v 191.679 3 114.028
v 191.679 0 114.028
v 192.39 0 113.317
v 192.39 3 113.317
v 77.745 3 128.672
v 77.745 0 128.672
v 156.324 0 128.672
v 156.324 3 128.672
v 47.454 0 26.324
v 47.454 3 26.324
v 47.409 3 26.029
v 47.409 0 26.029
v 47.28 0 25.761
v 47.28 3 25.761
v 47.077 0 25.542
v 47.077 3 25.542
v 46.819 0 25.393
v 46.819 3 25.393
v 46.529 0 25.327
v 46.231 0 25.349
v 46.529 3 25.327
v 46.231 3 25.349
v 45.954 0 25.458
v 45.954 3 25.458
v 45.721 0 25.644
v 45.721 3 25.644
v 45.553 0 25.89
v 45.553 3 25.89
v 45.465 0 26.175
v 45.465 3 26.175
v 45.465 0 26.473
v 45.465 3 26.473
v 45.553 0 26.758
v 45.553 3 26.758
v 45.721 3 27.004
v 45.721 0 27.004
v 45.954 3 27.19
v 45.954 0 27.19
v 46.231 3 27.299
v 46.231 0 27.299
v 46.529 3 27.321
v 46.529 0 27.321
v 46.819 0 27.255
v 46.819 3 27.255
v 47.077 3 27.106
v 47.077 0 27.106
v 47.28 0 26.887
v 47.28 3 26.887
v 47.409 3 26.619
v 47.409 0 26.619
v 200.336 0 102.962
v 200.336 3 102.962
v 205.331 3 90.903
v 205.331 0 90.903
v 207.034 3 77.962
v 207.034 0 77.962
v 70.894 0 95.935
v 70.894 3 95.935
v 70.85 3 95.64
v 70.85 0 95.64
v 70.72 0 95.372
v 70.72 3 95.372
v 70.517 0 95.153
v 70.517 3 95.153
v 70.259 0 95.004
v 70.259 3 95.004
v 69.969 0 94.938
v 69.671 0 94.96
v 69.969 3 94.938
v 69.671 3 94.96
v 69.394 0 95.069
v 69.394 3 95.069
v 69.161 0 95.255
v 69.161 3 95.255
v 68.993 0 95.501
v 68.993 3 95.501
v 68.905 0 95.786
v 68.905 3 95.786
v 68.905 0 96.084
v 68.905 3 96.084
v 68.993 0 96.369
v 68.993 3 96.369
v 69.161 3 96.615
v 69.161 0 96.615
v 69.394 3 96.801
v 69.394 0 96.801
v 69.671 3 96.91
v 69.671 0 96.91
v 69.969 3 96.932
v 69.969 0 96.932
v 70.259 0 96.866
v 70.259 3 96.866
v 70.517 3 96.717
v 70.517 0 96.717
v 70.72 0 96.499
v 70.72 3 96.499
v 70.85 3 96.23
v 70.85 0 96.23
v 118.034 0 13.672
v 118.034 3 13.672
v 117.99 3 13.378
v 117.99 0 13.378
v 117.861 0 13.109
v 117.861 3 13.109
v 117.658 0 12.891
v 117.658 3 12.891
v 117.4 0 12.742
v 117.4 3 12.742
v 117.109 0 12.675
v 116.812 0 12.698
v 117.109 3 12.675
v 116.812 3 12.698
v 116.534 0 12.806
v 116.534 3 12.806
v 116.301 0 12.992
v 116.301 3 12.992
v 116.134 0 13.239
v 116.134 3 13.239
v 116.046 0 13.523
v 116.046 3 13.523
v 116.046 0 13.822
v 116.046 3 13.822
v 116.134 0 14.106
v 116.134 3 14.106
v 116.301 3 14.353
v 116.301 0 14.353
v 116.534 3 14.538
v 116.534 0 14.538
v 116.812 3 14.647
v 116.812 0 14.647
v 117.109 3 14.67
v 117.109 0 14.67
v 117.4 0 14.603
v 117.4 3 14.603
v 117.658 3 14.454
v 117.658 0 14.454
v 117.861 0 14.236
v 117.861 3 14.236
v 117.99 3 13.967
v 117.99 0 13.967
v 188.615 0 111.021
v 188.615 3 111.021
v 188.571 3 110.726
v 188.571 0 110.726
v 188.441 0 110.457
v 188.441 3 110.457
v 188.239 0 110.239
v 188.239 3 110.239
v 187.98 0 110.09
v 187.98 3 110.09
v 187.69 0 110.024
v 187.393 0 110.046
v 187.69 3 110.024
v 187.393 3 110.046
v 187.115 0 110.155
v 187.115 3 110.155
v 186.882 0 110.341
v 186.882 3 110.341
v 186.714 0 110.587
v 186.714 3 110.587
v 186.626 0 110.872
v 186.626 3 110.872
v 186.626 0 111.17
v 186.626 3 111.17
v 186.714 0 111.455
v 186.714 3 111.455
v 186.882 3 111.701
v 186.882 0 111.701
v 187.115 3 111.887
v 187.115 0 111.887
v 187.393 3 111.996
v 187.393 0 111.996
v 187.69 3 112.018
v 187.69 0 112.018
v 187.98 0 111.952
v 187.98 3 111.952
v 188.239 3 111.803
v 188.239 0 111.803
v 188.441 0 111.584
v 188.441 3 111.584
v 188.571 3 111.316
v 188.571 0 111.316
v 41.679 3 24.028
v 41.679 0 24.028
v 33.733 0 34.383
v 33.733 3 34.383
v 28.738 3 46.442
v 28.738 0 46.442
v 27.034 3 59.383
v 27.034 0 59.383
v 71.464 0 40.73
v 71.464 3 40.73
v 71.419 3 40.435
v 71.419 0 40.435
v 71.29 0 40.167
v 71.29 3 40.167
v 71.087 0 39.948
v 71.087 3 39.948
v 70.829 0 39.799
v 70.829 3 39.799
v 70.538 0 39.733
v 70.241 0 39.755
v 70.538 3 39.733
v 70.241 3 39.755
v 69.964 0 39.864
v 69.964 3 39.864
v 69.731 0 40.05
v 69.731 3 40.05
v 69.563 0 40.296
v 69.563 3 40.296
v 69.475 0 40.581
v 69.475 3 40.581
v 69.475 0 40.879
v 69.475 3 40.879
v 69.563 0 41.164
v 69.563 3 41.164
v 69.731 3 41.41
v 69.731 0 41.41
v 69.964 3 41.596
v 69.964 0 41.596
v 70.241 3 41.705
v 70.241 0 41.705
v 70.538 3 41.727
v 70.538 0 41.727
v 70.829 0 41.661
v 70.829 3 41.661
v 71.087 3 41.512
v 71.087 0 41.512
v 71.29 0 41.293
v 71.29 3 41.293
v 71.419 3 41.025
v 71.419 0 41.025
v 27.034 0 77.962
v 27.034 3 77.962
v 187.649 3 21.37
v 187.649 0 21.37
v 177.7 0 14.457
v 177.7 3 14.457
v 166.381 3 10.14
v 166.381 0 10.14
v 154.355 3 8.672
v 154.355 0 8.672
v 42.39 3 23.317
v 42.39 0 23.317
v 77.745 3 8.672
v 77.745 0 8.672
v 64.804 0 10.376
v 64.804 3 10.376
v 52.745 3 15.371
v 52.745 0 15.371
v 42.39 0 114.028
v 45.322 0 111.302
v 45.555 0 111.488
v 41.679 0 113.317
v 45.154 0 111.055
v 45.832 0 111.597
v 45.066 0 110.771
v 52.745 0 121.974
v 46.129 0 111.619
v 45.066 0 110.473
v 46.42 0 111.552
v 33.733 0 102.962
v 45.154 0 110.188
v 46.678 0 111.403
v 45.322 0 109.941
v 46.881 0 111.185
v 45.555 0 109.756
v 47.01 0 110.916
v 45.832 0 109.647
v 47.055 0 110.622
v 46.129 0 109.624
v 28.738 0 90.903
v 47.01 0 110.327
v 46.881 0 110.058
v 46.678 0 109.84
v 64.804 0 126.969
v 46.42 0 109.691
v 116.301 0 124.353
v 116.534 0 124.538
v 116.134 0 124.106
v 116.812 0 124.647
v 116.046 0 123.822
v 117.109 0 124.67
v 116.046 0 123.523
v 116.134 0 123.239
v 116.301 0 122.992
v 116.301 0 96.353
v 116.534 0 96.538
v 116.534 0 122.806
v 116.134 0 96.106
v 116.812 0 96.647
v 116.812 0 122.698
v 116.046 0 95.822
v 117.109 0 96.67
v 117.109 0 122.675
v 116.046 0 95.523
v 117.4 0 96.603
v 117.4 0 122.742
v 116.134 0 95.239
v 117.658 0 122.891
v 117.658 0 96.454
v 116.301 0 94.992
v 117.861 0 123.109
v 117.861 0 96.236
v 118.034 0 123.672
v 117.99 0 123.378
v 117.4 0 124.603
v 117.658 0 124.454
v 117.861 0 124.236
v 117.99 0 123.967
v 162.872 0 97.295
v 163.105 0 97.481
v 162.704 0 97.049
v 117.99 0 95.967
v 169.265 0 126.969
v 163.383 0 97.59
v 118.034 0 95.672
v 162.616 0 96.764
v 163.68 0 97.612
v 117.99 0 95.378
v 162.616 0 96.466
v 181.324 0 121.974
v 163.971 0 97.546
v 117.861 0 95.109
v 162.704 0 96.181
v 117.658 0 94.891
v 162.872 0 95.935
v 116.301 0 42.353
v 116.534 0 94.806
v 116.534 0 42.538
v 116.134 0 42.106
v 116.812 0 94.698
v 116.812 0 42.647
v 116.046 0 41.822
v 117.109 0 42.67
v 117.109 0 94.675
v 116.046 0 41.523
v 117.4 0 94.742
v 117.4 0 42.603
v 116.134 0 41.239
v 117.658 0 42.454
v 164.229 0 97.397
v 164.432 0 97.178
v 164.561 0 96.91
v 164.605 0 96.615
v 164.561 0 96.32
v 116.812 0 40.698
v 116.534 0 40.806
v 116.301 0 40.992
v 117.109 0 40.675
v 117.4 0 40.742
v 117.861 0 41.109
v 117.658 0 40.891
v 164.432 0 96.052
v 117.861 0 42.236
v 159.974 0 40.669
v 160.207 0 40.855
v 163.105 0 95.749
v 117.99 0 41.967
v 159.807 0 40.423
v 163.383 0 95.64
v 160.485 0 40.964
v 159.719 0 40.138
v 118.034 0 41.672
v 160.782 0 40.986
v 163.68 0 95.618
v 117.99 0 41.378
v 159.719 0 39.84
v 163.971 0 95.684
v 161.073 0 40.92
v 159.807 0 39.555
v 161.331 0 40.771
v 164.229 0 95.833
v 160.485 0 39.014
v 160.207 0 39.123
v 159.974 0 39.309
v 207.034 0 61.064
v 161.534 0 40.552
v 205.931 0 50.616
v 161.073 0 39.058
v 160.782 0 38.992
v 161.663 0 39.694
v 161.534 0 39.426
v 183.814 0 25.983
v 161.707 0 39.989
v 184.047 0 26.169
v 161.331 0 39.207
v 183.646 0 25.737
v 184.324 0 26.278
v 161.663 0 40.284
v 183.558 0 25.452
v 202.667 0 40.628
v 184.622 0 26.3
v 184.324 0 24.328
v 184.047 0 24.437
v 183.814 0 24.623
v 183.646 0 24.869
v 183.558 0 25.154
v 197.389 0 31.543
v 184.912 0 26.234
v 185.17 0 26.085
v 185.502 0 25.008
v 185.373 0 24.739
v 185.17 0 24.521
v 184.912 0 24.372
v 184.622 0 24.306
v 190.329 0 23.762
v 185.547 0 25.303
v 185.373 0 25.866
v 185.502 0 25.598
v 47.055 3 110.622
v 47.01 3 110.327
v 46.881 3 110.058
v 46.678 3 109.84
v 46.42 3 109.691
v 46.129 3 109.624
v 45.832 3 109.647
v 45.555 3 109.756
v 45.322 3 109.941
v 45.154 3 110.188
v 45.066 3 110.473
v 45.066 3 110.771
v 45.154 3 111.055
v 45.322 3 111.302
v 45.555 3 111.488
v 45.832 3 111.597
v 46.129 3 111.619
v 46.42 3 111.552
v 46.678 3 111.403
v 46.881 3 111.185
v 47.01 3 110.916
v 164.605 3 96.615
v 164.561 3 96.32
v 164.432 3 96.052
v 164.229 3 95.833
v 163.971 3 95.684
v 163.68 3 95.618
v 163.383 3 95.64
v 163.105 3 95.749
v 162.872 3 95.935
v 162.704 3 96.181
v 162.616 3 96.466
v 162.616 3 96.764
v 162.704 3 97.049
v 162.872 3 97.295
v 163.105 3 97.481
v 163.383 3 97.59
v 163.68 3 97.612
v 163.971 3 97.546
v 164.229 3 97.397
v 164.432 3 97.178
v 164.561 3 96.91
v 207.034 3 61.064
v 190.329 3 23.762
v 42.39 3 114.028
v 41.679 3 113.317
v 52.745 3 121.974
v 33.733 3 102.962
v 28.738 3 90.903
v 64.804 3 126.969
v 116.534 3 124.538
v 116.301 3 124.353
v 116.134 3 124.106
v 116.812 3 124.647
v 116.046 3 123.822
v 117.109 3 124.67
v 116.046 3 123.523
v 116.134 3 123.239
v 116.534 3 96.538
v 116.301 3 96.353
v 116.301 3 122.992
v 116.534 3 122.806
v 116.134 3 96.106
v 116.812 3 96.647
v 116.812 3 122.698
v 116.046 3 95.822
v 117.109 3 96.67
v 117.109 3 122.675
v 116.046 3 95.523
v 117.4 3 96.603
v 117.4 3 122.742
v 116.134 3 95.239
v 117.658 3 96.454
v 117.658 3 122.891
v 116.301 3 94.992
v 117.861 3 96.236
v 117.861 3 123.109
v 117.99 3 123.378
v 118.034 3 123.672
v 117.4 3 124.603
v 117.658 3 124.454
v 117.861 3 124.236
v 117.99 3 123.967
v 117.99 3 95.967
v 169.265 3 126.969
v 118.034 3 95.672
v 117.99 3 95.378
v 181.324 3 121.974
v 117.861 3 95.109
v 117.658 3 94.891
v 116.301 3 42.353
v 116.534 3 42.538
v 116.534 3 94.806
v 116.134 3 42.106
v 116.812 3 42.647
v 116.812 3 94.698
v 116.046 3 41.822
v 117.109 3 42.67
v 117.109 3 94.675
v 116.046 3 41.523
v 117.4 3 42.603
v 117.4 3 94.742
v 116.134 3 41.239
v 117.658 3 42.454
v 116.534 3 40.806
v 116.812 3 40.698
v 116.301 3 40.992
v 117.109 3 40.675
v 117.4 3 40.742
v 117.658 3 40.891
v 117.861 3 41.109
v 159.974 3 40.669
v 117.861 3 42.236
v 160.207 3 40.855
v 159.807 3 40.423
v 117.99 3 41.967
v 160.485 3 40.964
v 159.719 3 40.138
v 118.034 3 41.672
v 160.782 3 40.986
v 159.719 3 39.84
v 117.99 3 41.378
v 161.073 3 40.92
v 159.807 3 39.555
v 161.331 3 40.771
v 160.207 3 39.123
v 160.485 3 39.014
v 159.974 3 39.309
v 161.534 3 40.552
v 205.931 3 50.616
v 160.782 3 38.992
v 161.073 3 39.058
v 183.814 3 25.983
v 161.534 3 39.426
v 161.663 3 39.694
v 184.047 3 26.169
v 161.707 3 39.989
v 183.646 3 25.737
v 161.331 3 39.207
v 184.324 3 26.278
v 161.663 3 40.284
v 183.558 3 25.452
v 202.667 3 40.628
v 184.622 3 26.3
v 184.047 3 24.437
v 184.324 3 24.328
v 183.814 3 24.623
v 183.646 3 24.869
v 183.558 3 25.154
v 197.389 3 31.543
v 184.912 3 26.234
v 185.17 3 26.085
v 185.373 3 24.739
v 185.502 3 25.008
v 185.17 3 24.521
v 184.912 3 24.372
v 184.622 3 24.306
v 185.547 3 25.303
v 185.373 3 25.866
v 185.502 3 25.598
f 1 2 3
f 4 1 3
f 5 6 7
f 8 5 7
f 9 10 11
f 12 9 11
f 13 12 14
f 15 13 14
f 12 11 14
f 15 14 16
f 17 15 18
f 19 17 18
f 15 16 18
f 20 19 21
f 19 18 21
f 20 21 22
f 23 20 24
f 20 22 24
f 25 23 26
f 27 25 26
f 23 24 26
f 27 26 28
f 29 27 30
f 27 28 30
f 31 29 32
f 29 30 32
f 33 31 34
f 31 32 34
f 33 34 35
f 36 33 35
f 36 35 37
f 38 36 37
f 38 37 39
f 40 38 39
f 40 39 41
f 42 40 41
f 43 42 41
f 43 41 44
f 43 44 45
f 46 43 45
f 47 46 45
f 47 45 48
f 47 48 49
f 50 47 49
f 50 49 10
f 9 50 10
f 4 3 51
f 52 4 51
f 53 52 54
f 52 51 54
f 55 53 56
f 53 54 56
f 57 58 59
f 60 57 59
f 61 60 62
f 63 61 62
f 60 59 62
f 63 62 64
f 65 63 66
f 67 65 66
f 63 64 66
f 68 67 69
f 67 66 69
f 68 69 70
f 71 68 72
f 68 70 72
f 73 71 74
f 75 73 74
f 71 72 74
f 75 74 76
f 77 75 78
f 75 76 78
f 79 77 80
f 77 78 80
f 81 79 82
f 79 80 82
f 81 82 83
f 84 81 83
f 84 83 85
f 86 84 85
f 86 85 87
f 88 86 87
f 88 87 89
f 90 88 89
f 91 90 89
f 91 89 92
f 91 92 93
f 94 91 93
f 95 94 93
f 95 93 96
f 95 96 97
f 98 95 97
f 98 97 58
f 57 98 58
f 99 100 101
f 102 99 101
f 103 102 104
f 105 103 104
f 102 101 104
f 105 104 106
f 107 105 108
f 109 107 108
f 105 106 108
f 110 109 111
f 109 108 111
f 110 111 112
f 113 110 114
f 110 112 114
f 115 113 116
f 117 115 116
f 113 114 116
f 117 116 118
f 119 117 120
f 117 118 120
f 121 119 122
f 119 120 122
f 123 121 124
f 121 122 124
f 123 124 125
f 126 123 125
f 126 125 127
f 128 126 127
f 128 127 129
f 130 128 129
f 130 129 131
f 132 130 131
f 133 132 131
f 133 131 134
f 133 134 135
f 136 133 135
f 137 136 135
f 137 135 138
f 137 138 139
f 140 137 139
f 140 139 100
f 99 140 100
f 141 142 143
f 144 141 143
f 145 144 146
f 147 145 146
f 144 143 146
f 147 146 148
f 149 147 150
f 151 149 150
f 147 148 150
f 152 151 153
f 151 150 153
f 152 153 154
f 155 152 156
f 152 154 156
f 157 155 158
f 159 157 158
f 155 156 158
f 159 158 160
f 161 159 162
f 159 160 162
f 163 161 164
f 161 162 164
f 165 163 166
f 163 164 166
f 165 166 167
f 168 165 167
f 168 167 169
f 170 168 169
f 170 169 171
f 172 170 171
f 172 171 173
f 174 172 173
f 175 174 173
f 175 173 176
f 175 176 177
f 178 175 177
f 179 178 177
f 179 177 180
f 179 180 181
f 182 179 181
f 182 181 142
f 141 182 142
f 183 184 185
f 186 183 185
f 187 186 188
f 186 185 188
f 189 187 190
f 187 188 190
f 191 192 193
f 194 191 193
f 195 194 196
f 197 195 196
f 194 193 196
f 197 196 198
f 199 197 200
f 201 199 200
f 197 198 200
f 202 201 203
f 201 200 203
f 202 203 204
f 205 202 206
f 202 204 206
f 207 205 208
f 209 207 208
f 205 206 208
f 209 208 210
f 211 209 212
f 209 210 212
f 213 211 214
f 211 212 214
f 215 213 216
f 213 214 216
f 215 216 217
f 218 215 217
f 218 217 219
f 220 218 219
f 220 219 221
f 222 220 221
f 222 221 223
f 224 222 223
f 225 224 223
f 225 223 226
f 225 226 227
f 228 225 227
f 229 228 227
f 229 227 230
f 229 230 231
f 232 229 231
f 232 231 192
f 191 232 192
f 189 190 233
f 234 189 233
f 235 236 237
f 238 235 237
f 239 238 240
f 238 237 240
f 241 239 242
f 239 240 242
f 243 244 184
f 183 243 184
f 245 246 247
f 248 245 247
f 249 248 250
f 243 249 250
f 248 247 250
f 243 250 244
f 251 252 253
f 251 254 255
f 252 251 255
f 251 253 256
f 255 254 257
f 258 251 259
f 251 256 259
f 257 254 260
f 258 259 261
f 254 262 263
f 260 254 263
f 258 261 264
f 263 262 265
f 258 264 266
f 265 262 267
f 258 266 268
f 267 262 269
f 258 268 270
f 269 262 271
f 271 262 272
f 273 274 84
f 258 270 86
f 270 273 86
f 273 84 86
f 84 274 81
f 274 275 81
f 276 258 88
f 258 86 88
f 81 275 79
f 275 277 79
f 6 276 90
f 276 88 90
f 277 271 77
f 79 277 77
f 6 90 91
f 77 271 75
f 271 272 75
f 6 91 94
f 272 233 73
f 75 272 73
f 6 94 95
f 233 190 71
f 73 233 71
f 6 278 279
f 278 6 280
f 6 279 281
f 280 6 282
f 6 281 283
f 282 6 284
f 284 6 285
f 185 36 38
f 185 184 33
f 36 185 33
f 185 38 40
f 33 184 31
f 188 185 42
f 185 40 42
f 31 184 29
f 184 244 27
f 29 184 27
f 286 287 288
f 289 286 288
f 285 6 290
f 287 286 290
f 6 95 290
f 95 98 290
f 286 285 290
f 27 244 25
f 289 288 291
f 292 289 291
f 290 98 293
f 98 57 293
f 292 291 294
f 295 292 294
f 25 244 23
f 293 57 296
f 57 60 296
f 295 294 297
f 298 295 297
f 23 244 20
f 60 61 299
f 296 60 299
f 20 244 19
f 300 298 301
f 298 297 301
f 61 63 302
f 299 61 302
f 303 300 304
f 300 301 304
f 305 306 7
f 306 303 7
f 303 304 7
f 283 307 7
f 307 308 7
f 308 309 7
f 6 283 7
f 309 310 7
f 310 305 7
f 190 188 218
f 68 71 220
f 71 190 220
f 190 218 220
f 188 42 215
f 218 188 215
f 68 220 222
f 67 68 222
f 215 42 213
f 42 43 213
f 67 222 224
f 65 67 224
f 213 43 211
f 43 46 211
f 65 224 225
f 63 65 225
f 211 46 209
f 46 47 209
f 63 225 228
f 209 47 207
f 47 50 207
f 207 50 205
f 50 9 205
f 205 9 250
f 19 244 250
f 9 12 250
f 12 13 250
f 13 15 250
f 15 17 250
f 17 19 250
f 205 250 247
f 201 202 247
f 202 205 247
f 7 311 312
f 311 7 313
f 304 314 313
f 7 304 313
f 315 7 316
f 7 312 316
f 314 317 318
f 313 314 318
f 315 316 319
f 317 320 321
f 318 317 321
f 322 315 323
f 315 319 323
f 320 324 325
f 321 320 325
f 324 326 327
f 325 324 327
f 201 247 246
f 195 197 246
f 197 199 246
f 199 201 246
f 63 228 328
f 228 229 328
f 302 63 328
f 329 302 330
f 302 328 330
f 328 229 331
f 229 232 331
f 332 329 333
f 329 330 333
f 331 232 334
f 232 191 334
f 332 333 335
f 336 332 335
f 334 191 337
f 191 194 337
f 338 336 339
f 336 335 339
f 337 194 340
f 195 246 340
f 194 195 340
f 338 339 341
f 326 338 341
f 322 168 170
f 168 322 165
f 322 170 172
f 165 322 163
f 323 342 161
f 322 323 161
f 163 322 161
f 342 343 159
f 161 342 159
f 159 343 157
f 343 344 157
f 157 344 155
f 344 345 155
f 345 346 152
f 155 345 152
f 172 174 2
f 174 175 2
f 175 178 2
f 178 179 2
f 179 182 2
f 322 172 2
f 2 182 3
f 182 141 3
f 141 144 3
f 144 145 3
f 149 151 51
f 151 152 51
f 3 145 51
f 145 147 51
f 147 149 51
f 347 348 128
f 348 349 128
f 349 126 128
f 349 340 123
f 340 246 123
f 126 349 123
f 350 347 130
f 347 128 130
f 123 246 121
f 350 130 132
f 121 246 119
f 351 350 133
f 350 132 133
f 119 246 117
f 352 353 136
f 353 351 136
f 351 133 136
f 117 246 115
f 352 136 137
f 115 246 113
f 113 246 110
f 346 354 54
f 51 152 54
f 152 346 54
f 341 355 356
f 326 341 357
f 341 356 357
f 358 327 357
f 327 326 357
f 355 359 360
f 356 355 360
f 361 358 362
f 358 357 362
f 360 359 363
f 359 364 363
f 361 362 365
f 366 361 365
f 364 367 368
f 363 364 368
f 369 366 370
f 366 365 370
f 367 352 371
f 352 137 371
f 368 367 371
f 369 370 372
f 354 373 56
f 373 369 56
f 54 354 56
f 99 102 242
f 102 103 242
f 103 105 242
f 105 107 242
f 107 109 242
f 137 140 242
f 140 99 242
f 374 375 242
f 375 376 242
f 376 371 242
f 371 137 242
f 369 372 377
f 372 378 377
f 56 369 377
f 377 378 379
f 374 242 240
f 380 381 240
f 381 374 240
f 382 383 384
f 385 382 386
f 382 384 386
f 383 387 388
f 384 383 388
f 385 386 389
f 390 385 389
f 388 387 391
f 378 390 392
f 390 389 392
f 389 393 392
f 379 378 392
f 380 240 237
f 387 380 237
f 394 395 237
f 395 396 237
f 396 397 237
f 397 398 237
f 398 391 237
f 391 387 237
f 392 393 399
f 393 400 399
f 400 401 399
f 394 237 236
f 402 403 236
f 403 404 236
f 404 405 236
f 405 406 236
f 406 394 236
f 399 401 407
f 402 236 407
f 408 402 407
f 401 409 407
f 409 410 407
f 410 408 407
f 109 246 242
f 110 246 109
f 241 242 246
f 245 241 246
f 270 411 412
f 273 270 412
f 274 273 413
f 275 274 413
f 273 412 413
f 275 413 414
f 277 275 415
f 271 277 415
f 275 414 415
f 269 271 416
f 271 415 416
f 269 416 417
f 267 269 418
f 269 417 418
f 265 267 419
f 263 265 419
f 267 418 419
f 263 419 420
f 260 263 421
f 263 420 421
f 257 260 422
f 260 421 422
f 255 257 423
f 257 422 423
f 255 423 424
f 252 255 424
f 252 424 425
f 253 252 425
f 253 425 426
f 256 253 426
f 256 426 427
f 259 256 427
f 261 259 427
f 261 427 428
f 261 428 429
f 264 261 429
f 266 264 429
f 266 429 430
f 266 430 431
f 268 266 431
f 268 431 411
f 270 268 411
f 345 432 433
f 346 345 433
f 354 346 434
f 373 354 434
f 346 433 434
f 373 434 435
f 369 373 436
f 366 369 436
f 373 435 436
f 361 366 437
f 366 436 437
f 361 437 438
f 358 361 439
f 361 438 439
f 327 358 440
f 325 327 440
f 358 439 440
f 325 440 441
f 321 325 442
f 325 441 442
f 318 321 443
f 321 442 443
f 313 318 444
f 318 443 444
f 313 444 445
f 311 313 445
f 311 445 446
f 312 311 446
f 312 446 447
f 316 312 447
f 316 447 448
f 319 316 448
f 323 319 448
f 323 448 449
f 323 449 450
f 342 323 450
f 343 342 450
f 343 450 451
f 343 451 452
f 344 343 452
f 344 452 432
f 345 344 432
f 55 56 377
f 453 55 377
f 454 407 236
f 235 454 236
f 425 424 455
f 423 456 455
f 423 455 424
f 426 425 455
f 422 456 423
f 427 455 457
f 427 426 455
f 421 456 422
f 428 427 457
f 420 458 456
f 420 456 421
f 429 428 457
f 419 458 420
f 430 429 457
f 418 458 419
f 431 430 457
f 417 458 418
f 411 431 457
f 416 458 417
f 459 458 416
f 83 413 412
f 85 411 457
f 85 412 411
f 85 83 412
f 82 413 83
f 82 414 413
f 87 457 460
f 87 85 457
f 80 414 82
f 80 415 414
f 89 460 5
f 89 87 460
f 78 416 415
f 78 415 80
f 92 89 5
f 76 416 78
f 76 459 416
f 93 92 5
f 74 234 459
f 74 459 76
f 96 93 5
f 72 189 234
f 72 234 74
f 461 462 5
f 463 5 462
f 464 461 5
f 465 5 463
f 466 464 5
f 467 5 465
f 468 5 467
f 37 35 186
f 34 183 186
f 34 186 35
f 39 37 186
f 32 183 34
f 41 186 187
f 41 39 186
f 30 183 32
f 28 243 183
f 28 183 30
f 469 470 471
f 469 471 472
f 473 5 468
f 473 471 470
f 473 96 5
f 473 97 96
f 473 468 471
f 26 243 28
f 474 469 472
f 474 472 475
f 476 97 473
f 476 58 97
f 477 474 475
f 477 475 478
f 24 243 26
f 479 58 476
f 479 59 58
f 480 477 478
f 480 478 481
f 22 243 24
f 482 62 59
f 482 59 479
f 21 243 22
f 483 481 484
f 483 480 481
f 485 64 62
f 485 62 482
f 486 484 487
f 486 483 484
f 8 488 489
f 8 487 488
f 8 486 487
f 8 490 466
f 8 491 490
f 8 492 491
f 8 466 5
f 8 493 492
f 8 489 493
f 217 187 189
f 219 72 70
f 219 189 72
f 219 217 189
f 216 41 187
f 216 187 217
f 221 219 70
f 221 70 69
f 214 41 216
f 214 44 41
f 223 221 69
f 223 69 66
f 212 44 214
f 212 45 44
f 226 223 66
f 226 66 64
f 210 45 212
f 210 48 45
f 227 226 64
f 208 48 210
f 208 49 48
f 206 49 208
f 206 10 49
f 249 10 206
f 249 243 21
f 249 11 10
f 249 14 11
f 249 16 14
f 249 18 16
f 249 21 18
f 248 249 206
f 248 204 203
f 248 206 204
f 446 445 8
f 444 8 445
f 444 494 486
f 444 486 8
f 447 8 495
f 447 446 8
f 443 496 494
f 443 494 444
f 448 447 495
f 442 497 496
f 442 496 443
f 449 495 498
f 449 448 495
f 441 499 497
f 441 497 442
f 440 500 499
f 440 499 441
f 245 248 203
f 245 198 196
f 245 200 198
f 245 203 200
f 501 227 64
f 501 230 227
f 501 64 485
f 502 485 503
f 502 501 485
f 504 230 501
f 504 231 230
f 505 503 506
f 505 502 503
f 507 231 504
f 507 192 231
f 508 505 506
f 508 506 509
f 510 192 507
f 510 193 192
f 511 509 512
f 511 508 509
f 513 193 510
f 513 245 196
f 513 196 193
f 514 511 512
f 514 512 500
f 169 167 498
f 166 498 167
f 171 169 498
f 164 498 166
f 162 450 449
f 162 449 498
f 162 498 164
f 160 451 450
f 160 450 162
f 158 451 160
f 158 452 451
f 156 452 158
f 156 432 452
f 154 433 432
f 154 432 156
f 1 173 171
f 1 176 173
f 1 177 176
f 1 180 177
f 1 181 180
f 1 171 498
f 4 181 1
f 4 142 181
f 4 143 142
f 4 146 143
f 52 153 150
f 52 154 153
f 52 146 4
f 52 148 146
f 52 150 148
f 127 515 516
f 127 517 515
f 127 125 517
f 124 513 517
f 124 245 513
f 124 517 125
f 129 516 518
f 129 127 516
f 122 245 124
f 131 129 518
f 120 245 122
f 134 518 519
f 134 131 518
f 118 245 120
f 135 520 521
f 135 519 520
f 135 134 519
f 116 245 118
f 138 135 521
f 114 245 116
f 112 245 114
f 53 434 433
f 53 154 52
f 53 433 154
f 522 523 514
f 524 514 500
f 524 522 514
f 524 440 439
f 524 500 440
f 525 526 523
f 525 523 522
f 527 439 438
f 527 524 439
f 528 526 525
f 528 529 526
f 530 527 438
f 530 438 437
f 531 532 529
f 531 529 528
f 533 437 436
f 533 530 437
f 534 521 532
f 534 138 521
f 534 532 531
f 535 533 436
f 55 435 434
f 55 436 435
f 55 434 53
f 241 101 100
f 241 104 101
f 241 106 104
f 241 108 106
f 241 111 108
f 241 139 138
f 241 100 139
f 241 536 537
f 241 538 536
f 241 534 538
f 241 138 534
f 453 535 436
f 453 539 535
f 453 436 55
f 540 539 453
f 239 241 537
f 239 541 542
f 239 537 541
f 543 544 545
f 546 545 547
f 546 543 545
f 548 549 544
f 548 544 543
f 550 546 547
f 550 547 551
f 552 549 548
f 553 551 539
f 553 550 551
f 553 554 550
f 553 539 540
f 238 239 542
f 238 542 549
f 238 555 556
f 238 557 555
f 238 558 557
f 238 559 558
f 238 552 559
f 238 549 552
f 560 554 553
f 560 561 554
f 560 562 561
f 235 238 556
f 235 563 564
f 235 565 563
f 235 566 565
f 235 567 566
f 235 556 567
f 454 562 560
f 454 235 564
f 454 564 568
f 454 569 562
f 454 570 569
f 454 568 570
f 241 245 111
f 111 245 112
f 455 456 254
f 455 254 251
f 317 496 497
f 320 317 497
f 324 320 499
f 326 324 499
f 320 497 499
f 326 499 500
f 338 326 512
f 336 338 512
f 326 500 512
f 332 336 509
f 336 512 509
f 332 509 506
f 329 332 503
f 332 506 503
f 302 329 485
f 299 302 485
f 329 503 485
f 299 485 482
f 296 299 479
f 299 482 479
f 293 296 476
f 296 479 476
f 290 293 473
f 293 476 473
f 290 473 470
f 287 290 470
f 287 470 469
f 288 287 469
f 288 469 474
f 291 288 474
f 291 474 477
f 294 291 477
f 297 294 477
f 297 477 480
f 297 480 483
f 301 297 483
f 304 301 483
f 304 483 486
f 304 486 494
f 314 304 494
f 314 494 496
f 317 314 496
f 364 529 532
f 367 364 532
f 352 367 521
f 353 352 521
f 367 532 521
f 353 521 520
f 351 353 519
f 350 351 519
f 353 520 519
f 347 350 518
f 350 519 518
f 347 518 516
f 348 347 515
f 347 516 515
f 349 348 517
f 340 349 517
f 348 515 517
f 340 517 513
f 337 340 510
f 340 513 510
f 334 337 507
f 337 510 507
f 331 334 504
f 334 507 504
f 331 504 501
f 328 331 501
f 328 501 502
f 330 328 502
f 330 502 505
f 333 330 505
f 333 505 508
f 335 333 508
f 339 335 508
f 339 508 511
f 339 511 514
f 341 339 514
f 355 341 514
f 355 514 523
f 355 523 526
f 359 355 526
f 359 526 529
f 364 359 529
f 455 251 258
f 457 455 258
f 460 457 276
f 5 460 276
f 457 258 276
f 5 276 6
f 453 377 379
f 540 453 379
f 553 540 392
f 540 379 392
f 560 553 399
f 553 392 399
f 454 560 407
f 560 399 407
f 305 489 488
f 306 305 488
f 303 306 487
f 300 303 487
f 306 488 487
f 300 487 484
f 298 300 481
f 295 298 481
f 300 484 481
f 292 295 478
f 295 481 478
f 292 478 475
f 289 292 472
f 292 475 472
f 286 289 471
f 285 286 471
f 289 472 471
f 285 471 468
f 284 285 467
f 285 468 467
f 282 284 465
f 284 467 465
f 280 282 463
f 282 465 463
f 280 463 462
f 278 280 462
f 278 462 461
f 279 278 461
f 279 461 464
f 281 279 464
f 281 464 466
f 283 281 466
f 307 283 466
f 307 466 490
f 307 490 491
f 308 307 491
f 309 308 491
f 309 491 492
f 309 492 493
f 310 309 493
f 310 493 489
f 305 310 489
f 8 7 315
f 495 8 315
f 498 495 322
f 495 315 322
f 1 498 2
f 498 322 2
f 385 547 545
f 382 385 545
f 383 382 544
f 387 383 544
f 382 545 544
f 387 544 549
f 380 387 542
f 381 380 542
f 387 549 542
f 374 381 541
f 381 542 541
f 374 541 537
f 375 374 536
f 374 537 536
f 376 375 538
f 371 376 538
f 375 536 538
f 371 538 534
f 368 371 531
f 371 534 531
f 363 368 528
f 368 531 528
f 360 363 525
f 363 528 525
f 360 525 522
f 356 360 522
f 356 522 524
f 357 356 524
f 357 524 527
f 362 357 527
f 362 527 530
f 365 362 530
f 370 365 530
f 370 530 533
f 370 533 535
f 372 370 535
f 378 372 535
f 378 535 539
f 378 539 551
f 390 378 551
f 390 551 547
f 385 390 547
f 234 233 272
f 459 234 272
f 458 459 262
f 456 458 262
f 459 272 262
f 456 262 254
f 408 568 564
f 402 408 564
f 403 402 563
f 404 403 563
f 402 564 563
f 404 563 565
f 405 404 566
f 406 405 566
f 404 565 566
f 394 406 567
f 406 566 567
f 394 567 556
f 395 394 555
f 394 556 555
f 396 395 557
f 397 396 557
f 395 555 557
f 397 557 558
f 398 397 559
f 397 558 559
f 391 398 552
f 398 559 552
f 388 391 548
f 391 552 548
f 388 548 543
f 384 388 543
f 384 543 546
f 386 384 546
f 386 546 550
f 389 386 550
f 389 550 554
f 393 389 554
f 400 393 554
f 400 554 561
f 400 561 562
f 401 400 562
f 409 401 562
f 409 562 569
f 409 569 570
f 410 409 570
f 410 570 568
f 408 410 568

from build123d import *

# Parameters (mm, degrees)
BOSS_EXTRUDE1_DEPTH = 3
SKETCH3_R           = 1
CUT_EXTRUDE1_DEPTH  = 4


with BuildPart() as part:
    # Sketch1 → Boss-Extrude1 (new body)
    with BuildSketch(Plane(origin=(0, 0, 0), x_dir=(1, 0, 0), z_dir=(0, 1, 0))):
        with BuildLine():
            Line((27.034499206, -59.38314523), (27.034499206, -77.961788992))
            ThreePointArc((27.034499206, -77.961788992), (30.840522581, -97.095960611), (41.679160147, -113.317128052))
            Line((41.679160147, -113.317128052), (42.389838265, -114.02780617))
            ThreePointArc((42.389838265, -114.02780617), (58.611005706, -124.866443737), (77.745177325, -128.672467111))
            Line((77.745177325, -128.672467111), (156.323821087, -128.672467111))
            ThreePointArc((156.323821087, -128.672467111), (175.457992706, -124.866443737), (191.679160147, -114.02780617))
            Line((191.679160147, -114.02780617), (192.389838265, -113.317128052))
            ThreePointArc((192.389838265, -113.317128052), (203.228475832, -97.095960611), (207.034499206, -77.961788992))
            Line((207.034499206, -77.961788992), (207.034499206, -61.064291371))
            ThreePointArc((207.034499206, -61.064291371), (202.66744641, -40.628192686), (190.329134028, -23.761914877))
            Line((190.329134028, -23.761914877), (187.649401106, -21.370090617))
            ThreePointArc((187.649401106, -21.370090617), (172.171628737, -11.954596736), (154.354766284, -8.672467111))
            Line((154.354766284, -8.672467111), (77.745177325, -8.672467111))
            ThreePointArc((77.745177325, -8.672467111), (58.611005706, -12.478490485), (42.389838265, -23.317128052))
            Line((42.389838265, -23.317128052), (41.679160147, -24.02780617))
            ThreePointArc((41.679160147, -24.02780617), (30.840522581, -40.248973611), (27.034499206, -59.38314523))
        make_face()
    extrude(amount=BOSS_EXTRUDE1_DEPTH)

    # Sketch3 → Cut-Extrude1 (cut, through all)
    with BuildSketch(Plane(origin=(0, 3, 0), x_dir=(1, 0, 0), z_dir=(0, 1, 0))):
        with Locations((70.463718508, -40.729998692)):
            Circle(SKETCH3_R)
        with Locations((46.453916589, -26.324117541)):
            Circle(SKETCH3_R)
        with Locations((117.034499206, -41.672467111)):
            Circle(SKETCH3_R)
        with Locations((184.546793577, -25.302810972)):
            Circle(SKETCH3_R)
        with Locations((117.034499206, -13.672467111)):
            Circle(SKETCH3_R)
        with Locations((160.707496688, -39.989128545)):
            Circle(SKETCH3_R)
        with Locations((163.605279904, -96.61493553)):
            Circle(SKETCH3_R)
        with Locations((187.615081824, -111.020816682)):
            Circle(SKETCH3_R)
        with Locations((117.034499206, -95.672467111)):
            Circle(SKETCH3_R)
        with Locations((117.034499206, -123.672467111)):
            Circle(SKETCH3_R)
        with Locations((46.054672056, -110.621572149)):
            Circle(SKETCH3_R)
        with Locations((69.893968945, -95.935254577)):
            Circle(SKETCH3_R)
    extrude(amount=-CUT_EXTRUDE1_DEPTH, mode=Mode.SUBTRACT)


solid = part.part
